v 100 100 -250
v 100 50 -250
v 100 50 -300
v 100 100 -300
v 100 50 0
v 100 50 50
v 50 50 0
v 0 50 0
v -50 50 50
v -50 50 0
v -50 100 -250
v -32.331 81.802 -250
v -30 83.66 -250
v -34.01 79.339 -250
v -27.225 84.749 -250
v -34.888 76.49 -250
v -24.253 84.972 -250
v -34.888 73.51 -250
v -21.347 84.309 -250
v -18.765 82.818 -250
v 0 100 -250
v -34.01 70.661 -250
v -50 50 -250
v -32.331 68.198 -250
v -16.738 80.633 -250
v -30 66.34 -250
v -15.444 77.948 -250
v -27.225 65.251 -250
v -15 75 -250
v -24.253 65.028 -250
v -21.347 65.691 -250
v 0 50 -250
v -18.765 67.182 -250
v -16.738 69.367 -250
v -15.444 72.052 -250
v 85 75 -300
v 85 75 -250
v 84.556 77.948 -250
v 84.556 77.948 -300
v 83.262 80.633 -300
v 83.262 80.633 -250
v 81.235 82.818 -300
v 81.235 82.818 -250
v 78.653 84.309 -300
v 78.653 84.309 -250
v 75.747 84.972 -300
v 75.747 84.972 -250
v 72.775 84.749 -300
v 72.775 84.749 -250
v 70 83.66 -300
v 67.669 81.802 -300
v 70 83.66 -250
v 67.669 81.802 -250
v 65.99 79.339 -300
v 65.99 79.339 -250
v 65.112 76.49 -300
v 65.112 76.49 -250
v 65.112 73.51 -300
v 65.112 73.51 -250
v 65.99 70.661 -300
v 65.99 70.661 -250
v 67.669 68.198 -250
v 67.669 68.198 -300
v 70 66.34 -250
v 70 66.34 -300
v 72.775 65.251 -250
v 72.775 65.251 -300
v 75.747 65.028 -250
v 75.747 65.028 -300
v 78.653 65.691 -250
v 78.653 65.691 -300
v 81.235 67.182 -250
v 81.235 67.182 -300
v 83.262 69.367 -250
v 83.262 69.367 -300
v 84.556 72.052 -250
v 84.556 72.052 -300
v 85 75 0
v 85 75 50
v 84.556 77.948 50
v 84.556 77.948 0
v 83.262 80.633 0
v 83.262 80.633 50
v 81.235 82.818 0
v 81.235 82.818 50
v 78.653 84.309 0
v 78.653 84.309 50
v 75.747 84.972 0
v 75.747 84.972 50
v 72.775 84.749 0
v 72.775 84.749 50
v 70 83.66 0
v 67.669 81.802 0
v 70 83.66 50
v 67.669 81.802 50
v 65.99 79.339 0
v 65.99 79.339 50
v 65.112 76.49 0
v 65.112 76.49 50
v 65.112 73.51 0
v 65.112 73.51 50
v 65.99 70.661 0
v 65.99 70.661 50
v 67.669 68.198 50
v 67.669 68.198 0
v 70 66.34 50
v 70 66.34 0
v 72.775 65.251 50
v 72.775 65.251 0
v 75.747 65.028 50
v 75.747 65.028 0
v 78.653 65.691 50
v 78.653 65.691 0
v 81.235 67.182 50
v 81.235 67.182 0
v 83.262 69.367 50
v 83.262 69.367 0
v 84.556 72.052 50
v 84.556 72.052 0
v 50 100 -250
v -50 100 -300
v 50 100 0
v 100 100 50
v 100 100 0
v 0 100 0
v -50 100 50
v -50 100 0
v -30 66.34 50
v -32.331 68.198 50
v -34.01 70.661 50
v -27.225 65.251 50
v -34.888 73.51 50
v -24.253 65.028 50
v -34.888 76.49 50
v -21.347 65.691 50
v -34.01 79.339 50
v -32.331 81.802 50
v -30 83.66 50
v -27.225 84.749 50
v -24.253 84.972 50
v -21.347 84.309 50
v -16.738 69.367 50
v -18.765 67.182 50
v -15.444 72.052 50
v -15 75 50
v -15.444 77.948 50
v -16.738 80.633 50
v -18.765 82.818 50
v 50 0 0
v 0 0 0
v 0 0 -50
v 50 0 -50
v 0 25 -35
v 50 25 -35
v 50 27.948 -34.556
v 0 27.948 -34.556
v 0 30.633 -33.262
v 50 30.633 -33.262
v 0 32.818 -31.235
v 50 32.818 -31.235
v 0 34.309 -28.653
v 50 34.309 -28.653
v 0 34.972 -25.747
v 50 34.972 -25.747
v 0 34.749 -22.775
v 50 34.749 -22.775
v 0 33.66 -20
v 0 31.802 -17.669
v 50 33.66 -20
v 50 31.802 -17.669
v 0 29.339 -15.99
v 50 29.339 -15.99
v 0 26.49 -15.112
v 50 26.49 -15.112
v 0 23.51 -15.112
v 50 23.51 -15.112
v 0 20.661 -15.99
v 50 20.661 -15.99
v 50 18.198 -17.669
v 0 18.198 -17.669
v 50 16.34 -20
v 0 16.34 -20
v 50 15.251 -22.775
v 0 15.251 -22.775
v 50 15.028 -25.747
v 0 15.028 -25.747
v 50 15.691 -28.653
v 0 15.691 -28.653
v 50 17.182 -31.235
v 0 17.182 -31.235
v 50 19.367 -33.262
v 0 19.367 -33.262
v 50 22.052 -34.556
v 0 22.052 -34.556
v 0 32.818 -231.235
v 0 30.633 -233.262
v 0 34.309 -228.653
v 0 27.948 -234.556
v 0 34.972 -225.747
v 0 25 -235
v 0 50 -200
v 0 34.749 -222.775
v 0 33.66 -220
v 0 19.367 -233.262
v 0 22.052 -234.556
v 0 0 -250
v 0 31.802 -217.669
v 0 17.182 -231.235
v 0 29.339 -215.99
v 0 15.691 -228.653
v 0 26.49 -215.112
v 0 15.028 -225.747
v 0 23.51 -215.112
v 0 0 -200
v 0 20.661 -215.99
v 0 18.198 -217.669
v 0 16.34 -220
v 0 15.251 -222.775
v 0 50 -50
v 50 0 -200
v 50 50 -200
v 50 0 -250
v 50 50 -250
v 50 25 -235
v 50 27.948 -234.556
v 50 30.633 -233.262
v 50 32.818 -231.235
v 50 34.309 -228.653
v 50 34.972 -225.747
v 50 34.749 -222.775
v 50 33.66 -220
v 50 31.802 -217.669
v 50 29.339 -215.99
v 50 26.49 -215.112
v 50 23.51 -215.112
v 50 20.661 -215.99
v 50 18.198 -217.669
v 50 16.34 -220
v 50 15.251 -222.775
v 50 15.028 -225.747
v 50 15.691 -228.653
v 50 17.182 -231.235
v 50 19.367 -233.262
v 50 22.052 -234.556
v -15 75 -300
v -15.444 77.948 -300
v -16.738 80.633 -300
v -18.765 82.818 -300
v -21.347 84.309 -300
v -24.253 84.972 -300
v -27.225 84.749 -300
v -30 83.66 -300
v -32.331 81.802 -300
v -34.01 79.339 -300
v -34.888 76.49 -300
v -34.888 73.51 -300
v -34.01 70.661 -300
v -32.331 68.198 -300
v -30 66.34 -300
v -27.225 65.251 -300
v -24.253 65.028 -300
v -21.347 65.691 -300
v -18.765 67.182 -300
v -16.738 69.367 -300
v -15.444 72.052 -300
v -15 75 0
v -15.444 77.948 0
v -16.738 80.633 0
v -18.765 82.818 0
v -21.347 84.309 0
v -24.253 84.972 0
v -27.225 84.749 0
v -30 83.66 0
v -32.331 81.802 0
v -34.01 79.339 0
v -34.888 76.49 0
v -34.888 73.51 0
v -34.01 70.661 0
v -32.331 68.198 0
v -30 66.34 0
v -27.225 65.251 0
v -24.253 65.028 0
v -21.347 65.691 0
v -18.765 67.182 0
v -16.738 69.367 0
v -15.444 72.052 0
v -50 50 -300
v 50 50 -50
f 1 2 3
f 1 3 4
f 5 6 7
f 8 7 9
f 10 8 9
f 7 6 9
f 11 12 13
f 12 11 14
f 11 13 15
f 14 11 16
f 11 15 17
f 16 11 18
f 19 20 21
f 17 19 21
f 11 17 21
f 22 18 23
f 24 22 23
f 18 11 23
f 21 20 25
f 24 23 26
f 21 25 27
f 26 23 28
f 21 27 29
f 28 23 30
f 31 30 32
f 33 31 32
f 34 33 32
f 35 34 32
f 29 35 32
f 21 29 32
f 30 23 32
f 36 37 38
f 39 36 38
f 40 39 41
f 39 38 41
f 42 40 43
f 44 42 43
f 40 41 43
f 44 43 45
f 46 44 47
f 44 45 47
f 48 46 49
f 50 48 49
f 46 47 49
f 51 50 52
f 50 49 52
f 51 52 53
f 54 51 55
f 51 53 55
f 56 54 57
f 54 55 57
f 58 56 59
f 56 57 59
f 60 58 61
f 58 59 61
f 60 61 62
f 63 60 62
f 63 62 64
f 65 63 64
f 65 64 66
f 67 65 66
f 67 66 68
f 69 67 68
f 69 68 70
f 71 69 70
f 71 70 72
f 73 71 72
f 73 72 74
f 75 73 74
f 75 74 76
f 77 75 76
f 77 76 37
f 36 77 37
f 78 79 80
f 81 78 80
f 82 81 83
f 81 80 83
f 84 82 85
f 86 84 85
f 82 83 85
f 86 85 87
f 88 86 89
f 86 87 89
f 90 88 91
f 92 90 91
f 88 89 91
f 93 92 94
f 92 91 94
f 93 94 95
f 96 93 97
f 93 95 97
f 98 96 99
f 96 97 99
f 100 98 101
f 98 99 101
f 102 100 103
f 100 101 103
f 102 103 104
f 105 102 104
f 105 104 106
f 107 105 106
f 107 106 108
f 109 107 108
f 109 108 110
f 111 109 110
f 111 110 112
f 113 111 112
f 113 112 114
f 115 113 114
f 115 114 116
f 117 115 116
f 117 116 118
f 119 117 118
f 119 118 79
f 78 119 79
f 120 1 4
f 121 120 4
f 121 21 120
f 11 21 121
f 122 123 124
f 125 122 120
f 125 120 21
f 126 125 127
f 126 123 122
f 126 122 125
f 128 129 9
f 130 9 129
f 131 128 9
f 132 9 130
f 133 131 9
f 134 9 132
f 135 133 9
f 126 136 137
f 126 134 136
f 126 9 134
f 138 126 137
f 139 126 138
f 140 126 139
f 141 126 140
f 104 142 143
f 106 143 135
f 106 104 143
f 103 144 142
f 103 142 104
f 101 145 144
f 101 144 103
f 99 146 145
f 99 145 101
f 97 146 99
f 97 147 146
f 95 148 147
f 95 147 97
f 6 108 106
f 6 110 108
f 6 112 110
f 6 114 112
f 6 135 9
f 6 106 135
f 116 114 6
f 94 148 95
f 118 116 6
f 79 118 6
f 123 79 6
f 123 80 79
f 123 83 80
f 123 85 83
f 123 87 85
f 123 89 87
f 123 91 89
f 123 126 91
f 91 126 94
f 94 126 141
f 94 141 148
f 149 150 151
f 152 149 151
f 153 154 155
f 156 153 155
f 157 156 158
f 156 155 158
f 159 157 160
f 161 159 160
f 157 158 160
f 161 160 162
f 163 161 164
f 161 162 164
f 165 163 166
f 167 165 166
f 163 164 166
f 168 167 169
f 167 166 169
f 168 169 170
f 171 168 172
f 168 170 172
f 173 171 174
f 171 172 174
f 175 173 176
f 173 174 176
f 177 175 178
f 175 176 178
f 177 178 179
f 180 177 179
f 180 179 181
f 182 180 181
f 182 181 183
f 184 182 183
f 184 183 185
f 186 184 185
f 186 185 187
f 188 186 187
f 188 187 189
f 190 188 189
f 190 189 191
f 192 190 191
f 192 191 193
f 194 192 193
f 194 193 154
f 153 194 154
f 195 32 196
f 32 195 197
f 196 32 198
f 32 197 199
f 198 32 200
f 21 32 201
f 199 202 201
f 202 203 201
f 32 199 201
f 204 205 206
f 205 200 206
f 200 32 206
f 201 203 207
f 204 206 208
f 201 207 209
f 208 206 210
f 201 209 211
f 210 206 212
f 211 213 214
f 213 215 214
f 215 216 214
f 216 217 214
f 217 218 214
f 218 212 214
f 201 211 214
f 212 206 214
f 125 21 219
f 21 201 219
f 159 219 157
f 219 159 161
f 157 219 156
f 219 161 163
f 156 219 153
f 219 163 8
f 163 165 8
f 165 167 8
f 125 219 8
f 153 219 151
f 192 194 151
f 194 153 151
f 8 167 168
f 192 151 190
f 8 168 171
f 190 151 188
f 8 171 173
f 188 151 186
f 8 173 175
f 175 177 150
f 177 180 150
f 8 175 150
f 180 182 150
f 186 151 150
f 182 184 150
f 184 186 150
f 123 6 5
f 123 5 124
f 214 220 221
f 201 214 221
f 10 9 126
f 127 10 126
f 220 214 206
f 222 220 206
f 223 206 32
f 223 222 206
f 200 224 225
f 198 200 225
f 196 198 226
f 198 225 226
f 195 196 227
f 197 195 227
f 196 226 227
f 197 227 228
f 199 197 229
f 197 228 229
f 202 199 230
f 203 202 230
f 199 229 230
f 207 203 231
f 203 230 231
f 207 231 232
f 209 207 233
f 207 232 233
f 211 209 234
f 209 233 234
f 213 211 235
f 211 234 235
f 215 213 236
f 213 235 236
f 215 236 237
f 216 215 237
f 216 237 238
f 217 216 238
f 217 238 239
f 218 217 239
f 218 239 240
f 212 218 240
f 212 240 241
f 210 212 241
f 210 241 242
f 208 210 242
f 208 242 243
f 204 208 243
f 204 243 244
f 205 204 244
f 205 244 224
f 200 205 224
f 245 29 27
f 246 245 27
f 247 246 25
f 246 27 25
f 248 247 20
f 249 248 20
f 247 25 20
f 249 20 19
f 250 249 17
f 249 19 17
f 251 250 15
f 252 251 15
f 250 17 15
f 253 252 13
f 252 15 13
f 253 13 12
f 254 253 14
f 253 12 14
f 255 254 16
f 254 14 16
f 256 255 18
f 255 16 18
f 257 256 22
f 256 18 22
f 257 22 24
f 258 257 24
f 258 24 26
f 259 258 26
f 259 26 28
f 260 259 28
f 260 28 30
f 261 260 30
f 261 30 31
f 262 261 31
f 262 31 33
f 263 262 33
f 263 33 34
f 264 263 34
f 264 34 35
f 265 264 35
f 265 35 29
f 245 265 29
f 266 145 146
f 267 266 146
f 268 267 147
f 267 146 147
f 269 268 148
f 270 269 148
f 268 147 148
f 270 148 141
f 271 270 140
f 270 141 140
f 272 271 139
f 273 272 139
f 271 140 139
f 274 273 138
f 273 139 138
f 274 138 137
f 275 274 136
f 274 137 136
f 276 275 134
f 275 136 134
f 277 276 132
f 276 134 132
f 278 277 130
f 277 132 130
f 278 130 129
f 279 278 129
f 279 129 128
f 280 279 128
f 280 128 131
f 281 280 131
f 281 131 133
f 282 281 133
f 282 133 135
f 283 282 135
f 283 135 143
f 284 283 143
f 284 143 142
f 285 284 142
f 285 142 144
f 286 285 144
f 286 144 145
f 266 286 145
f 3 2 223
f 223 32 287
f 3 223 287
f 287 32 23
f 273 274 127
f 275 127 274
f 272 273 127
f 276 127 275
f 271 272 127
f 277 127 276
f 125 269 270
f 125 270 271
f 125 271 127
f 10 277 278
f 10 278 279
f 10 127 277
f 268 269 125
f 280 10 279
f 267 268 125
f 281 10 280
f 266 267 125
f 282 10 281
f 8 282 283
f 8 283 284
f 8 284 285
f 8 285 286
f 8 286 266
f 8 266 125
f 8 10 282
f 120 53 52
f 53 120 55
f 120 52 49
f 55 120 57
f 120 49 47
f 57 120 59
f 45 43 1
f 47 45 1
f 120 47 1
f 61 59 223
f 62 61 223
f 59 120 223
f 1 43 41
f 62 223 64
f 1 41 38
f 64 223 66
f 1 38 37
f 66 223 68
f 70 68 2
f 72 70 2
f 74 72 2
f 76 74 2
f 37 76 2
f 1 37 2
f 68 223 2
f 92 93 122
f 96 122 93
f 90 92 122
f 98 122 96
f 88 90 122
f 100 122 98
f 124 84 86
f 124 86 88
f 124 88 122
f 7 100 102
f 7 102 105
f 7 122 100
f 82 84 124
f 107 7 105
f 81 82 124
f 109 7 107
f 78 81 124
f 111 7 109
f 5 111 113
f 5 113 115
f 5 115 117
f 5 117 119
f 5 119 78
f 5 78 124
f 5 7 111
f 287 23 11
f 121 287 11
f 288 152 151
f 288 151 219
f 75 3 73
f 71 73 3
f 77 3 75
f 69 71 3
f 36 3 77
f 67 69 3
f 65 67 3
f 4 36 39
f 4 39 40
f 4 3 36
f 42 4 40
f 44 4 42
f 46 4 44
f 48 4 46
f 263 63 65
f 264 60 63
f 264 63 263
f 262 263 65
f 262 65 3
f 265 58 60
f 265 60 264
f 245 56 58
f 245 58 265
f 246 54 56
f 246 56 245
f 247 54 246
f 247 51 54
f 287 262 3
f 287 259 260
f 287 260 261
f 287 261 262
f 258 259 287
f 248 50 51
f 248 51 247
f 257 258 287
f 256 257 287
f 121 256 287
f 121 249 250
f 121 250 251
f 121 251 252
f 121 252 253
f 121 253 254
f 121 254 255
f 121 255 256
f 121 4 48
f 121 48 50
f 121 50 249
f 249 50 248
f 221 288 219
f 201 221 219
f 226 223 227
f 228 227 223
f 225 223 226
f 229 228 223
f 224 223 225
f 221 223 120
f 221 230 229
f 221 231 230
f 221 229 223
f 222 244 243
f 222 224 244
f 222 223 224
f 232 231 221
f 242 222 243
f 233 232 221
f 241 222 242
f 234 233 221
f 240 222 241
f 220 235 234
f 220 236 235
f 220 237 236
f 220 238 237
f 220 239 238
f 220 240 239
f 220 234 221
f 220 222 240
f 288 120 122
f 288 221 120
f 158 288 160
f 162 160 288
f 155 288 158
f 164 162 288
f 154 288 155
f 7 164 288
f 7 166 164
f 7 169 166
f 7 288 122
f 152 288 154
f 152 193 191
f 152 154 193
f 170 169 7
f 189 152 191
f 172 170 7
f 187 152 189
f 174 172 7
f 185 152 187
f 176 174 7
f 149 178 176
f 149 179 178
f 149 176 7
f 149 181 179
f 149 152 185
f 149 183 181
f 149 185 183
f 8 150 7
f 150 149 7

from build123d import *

# Parameters (mm, degrees)
SKETCH2_W           = 250
SKETCH2_H           = 100
BOSS_EXTRUDE1_DEPTH = 50
SKETCH3_W           = 150
SKETCH3_H           = 50
CUT_EXTRUDE1_DEPTH  = 109
SKETCH4_R           = 10
CUT_EXTRUDE2_DEPTH  = 109
SKETCH5_W           = 250
SKETCH5_H           = 50
BOSS_EXTRUDE2_DEPTH = 50
SKETCH8_W           = 150
SKETCH8_H           = 50
BOSS_EXTRUDE3_DEPTH = 50
SKETCH9_W           = 150
SKETCH9_H           = 50
BOSS_EXTRUDE4_DEPTH = 50
SKETCH10_W          = 50
SKETCH10_H          = 250
CUT_EXTRUDE5_DEPTH  = 50
SKETCH11_R          = 10
CUT_EXTRUDE6_DEPTH  = 398


with BuildPart() as part:
    # Sketch2 → Boss-Extrude1 (new body)
    with BuildSketch(Plane(origin=(0, 0, 0), x_dir=(0, 0, -1), z_dir=(1, 0, 0))):
        with Locations((125, 50)):
            Rectangle(SKETCH2_W, SKETCH2_H)
    extrude(amount=BOSS_EXTRUDE1_DEPTH)

    # Sketch3 → Cut-Extrude1 (cut)
    with BuildSketch(Plane(origin=(50, 0, 0), x_dir=(0, 0, -1), z_dir=(1, 0, 0))):
        with Locations((125, 25)):
            Rectangle(SKETCH3_W, SKETCH3_H)
    extrude(amount=-CUT_EXTRUDE1_DEPTH, mode=Mode.SUBTRACT)

    # Sketch4 → Cut-Extrude2 (cut)
    with BuildSketch(Plane(origin=(50, 0, 0), x_dir=(0, 0, -1), z_dir=(1, 0, 0))):
        with Locations((25, 25)):
            Circle(SKETCH4_R)
        with Locations((225, 25)):
            Circle(SKETCH4_R)
    extrude(amount=-CUT_EXTRUDE2_DEPTH, mode=Mode.SUBTRACT)

    # Sketch5 → Boss-Extrude2 (add)
    with BuildSketch(Plane(origin=(50, 0, 0), x_dir=(0, 0, -1), z_dir=(1, 0, 0))):
        with Locations((125, 75)):
            Rectangle(SKETCH5_W, SKETCH5_H)
    boss_extrude2 = extrude(amount=BOSS_EXTRUDE2_DEPTH)

    # Mirror1: Boss-Extrude2 across plane
    add(boss_extrude2.mirror(Plane(origin=(25, 0, 0), x_dir=(0, 0, 1), z_dir=(1, 0, 0))))

    # Sketch8 → Boss-Extrude3 (add)
    with BuildSketch(Plane.XY):
        with Locations((25, 75)):
            Rectangle(SKETCH8_W, SKETCH8_H)
    extrude(amount=BOSS_EXTRUDE3_DEPTH)

    # Sketch9 → Boss-Extrude4 (add)
    with BuildSketch(Plane(origin=(0, 0, -250), x_dir=(-1, 0, 0), z_dir=(0, 0, -1))):
        with Locations((-25, 75)):
            Rectangle(SKETCH9_W, SKETCH9_H)
    extrude(amount=BOSS_EXTRUDE4_DEPTH)

    # Sketch10 → Cut-Extrude5 (cut)
    with BuildSketch(Plane.XZ.offset(-50)):
        with Locations((75, -125)):
            Rectangle(SKETCH10_W, SKETCH10_H)
        with Locations((-25, -125)):
            Rectangle(SKETCH10_W, SKETCH10_H)
    extrude(amount=-CUT_EXTRUDE5_DEPTH, mode=Mode.SUBTRACT)

    # Sketch11 → Cut-Extrude6 (cut)
    with BuildSketch(Plane.XY.offset(50)):
        with Locations((-25, 75)):
            Circle(SKETCH11_R)
        with Locations((75, 75)):
            Circle(SKETCH11_R)
    extrude(amount=-CUT_EXTRUDE6_DEPTH, mode=Mode.SUBTRACT)


solid = part.part
